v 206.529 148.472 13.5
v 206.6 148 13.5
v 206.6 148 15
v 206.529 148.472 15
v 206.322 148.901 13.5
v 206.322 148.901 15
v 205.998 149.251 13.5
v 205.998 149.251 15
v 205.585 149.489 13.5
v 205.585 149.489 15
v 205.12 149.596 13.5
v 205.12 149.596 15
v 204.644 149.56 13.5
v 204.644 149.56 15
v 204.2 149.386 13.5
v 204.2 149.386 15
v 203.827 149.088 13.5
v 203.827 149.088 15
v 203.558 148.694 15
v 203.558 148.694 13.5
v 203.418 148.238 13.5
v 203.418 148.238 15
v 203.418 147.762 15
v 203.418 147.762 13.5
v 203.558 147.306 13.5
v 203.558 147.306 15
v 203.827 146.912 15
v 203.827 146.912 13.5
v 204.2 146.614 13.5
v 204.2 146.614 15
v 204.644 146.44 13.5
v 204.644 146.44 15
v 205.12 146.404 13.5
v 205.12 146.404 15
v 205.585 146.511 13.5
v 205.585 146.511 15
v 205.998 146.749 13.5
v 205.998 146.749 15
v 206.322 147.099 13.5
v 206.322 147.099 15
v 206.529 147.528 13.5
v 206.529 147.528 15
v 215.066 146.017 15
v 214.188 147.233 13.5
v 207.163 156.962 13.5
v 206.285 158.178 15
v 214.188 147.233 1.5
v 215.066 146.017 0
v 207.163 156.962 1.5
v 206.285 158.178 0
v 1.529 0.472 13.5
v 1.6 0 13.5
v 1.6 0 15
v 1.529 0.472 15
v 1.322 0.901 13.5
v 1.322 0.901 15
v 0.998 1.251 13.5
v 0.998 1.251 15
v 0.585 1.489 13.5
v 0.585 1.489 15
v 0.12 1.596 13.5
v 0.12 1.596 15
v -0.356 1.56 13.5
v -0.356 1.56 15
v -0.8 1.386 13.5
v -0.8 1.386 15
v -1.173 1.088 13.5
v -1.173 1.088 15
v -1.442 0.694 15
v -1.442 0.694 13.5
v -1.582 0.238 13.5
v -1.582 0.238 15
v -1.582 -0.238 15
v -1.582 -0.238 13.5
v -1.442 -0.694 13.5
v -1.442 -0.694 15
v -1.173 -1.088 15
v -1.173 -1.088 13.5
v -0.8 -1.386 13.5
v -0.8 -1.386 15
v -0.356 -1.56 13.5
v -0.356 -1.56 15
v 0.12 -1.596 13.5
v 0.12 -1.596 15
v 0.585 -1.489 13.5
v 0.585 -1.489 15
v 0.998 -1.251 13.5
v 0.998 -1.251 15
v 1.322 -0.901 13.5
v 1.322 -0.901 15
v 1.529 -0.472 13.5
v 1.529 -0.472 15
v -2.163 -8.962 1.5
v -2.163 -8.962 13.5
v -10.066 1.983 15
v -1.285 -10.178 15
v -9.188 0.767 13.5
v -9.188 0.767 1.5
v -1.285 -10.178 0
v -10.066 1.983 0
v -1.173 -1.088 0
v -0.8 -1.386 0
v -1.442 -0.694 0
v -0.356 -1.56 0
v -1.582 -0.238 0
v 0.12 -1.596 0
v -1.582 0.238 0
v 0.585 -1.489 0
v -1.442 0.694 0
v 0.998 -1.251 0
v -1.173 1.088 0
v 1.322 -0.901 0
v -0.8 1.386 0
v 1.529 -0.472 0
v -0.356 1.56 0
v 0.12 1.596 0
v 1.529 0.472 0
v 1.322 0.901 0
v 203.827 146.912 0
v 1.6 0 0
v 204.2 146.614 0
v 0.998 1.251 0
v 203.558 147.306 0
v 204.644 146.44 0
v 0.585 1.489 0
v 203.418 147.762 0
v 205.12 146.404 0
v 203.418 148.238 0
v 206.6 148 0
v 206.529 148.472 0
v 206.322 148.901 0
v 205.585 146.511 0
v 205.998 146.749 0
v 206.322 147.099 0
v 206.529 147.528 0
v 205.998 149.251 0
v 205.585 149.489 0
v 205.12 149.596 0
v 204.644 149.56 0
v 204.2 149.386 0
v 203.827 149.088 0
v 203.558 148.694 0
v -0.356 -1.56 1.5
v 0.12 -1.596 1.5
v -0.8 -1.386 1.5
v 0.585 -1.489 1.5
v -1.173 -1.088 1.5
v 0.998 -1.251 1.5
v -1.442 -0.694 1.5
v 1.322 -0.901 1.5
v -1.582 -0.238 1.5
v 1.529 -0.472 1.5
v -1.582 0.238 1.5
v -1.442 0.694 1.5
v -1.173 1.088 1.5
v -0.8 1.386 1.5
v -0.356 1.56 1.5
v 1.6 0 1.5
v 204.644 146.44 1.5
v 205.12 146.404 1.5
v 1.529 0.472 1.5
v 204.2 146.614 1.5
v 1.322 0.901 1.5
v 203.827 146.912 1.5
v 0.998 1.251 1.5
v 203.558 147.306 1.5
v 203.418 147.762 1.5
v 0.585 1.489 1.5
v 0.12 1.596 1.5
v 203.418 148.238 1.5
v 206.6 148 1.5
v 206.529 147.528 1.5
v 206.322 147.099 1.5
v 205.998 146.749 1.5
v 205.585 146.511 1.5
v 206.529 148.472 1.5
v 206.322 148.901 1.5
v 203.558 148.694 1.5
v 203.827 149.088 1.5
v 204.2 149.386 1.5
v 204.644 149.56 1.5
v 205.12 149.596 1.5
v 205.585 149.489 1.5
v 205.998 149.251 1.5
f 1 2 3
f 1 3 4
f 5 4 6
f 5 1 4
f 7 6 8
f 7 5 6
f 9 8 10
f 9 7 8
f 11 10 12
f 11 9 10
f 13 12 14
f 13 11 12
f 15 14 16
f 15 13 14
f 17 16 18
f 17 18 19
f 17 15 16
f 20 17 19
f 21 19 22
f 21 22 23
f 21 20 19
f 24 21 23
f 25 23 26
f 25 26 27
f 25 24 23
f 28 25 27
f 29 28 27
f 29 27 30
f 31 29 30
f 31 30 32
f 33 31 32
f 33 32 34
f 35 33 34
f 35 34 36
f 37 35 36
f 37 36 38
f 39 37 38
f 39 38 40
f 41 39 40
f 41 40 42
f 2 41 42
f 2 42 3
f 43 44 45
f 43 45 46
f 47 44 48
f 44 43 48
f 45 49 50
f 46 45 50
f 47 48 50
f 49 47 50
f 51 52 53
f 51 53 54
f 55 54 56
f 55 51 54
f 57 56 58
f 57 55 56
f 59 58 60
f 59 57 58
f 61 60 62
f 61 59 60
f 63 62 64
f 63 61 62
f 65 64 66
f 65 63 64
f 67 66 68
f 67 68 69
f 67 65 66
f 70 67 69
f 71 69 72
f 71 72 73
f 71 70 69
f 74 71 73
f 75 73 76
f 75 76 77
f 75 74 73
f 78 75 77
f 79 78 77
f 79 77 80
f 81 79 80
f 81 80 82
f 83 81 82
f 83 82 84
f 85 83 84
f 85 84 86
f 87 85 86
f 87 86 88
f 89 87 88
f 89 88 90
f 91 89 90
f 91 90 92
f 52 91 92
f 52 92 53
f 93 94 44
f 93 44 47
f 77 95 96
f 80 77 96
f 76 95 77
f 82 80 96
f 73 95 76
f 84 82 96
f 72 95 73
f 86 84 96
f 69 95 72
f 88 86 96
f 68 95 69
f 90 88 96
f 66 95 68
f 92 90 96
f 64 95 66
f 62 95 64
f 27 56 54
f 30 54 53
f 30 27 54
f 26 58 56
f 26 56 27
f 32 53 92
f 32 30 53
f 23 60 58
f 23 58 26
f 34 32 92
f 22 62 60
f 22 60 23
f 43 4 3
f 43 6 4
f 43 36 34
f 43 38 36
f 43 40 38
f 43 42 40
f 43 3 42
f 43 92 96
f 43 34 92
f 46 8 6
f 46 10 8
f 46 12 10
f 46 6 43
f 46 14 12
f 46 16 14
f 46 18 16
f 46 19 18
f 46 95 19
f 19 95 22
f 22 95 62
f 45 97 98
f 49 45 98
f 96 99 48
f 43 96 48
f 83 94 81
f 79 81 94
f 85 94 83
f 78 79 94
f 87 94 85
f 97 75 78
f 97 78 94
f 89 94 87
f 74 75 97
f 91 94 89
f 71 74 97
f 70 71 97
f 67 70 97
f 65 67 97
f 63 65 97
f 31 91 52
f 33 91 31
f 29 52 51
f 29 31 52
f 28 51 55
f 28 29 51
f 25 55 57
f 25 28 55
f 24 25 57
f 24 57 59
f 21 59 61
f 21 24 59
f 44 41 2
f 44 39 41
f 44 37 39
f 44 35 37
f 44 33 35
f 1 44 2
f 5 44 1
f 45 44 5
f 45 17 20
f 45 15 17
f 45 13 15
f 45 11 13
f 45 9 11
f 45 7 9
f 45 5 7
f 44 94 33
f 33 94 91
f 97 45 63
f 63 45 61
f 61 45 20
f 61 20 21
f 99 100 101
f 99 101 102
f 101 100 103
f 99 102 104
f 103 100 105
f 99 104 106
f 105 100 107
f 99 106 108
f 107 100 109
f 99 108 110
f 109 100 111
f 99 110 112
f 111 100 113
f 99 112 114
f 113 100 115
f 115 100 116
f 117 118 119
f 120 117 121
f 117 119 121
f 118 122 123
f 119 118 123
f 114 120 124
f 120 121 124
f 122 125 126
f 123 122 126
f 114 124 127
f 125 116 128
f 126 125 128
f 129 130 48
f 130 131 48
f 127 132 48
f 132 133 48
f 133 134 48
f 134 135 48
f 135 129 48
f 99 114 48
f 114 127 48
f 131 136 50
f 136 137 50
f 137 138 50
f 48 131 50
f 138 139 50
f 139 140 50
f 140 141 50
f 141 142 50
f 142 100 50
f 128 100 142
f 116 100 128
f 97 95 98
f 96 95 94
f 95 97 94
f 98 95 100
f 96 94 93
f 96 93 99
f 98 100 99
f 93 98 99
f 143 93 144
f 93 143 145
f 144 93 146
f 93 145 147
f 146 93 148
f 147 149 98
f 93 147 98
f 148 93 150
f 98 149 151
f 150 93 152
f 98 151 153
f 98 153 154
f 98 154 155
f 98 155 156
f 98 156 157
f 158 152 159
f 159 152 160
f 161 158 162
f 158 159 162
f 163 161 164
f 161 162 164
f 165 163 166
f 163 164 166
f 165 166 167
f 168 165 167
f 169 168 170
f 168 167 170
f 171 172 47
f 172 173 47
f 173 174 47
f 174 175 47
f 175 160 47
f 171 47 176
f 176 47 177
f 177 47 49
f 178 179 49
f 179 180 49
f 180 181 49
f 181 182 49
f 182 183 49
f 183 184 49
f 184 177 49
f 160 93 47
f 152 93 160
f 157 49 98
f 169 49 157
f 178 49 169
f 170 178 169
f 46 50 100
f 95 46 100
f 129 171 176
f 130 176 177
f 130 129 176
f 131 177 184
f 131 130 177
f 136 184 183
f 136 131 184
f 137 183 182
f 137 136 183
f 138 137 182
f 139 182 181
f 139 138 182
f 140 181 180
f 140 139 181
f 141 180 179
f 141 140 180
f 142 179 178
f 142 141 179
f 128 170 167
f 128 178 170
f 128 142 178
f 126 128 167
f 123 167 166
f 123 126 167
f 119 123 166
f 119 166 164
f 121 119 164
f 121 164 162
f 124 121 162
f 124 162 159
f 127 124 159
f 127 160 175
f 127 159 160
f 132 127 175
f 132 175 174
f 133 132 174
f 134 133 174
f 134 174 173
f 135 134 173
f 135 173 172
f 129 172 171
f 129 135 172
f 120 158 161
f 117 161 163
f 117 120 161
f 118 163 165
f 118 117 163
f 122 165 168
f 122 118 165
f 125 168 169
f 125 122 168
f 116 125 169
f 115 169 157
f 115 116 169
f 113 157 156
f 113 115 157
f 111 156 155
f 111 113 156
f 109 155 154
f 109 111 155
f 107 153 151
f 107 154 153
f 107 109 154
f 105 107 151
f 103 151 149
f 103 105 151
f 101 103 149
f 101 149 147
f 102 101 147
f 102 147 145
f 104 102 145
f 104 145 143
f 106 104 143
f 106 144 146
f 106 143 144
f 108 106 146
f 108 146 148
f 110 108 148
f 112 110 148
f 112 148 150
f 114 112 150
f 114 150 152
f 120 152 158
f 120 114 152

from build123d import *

# Parameters (mm, degrees)
SKETCH_2_R          = 1.6
EXTRUDE_1_DEPTH     = 15
SKETCH_3_W          = 12
SKETCH_3_H          = 12
CUT_EXTRUDE_1_DEPTH = 275.381172618


with BuildPart() as part:
    # ｽｹｯﾁ2 → ﾎﾞｽ - 押し出し1 (new body)
    with BuildSketch(Plane.XY):
        Polygon((-10.065580607, 1.98345331), (-1.285388486, -10.17829929), (215.065580607, 146.01654669), (206.285388486, 158.17829929), align=None)
        Circle(SKETCH_2_R, mode=Mode.SUBTRACT)
        with Locations((205, 148)):
            Circle(SKETCH_2_R, mode=Mode.SUBTRACT)
    extrude(amount=EXTRUDE_1_DEPTH)

    # ｽｹｯﾁ3 → ｶｯﾄ - 押し出し1 (cut, through all)
    with BuildSketch(Plane(origin=(210.675484547, 152.09742299, 0), x_dir=(0, 0, -1), z_dir=(0.8107835066939648, 0.5853461414180824, 0))):
        with Locations((-7.5, 0)):
            Rectangle(SKETCH_3_W, SKETCH_3_H)
    extrude(amount=-CUT_EXTRUDE_1_DEPTH, mode=Mode.SUBTRACT)


solid = part.part
